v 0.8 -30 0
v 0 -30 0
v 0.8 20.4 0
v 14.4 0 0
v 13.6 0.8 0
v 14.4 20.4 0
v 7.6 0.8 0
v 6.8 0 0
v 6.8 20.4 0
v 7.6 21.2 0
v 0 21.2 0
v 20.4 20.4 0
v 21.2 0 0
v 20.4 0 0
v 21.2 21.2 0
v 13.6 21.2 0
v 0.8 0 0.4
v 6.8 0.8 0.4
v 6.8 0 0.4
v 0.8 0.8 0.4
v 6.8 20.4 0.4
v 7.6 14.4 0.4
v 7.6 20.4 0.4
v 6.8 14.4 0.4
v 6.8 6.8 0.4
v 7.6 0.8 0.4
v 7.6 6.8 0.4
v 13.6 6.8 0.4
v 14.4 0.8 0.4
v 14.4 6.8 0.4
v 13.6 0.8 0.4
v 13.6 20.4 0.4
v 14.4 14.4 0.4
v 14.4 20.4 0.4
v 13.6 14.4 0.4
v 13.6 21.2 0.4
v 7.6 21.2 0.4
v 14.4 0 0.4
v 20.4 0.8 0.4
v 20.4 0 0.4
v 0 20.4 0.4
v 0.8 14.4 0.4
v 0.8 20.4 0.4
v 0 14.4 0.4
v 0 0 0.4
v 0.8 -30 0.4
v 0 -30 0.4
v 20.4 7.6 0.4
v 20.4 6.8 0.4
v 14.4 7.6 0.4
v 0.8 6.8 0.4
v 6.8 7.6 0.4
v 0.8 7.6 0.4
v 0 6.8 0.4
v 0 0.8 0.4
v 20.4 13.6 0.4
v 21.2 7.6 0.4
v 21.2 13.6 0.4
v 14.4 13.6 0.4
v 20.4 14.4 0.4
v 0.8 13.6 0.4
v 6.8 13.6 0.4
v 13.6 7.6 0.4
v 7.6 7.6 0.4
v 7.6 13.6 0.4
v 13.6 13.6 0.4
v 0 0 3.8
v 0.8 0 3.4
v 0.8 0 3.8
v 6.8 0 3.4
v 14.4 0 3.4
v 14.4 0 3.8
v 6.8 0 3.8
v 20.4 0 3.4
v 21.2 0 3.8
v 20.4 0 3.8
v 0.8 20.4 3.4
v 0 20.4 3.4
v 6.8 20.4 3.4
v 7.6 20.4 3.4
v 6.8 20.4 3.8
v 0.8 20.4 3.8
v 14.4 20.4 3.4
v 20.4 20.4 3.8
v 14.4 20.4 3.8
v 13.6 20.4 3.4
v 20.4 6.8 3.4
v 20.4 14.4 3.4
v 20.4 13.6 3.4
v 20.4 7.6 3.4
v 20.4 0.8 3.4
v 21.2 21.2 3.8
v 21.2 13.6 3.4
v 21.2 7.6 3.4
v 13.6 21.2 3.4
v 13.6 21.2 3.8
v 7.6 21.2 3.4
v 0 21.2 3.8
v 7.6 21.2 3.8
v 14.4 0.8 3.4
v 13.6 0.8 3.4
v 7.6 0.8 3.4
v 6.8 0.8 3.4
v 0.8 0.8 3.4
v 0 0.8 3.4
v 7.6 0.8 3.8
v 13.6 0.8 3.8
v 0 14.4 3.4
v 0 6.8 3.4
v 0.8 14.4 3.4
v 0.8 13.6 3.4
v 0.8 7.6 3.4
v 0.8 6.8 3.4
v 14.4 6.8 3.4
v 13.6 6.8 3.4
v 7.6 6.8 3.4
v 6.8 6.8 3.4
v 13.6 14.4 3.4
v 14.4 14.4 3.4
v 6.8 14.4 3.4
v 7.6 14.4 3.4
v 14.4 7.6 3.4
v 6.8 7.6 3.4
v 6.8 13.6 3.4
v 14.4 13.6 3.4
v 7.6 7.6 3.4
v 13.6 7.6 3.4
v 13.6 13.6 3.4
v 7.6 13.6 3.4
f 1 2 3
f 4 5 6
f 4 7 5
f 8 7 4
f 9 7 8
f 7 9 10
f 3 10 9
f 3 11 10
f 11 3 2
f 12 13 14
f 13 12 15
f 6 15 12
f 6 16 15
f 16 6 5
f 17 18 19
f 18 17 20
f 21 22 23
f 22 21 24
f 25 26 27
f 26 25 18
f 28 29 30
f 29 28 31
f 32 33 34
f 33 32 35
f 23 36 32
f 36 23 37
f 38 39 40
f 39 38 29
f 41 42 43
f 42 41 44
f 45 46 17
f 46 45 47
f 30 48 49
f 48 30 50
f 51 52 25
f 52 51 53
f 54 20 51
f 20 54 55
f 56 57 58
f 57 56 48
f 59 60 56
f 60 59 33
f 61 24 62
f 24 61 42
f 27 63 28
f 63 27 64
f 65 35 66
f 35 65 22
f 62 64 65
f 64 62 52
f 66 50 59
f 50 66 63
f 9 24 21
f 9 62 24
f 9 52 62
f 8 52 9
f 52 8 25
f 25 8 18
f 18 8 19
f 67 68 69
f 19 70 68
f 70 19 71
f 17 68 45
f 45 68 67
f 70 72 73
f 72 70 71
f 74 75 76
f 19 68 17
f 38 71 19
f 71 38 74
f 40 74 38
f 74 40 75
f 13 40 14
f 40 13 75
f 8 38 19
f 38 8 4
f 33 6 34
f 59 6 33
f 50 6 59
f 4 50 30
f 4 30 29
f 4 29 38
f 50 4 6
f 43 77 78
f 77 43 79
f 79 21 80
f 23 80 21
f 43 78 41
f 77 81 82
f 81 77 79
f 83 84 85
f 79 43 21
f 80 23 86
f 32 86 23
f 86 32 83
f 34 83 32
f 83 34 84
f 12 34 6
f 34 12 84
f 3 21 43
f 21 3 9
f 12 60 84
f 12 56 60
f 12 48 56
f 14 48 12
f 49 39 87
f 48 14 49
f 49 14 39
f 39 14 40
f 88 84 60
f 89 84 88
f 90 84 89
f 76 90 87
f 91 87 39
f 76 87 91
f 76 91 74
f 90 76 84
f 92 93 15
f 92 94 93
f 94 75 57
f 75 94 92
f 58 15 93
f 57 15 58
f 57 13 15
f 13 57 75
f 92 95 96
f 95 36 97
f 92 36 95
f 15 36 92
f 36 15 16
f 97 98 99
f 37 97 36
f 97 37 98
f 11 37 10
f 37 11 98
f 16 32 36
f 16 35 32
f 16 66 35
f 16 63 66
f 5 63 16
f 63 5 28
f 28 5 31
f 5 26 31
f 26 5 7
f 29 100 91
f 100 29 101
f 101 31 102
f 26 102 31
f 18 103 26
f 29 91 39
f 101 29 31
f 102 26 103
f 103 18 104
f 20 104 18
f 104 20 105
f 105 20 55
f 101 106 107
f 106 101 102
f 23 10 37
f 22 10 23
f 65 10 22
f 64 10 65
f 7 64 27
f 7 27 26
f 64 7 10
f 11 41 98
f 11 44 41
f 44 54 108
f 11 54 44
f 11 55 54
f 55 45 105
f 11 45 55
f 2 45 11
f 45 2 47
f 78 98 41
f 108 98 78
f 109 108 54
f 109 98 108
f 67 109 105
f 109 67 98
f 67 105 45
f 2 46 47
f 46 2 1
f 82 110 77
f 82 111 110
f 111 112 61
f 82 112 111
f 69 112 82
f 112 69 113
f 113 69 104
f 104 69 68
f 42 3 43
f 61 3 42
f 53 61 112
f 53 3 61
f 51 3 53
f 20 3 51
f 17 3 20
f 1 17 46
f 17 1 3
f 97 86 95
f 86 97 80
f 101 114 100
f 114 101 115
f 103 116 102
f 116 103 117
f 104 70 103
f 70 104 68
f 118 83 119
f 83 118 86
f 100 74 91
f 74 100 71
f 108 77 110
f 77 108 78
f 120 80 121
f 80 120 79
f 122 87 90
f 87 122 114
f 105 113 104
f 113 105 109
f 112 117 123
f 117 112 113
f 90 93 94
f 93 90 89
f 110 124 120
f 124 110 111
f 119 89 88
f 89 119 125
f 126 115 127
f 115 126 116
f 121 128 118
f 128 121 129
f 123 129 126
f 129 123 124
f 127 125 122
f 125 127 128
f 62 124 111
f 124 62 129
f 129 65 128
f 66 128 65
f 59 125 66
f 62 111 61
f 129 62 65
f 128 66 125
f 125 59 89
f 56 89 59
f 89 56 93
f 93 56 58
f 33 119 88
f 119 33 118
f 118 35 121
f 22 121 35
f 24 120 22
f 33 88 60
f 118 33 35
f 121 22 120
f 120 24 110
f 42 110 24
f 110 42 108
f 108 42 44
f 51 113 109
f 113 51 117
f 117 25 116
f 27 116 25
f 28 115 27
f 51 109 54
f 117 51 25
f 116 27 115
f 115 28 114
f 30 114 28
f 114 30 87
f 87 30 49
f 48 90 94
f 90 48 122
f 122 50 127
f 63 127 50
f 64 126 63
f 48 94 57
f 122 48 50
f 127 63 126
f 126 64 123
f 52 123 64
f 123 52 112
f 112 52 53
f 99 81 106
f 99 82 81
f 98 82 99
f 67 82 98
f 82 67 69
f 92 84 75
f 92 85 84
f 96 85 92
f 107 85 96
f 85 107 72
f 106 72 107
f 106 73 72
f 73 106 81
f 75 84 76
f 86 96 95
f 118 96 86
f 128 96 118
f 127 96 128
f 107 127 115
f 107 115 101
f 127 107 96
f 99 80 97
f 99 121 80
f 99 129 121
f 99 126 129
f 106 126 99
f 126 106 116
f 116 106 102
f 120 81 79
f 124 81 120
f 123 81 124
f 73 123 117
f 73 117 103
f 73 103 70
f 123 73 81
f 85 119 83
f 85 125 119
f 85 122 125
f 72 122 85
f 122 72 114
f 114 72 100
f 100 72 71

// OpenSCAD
// file: ../../api/v3/reporting.scad
//////////////////////////////////////////////////////////////////////
// LibFile: reporting.scad
// Project: Grid Stack
// FileGroup: API v3 Reporting
// FileSummary: Console report for immutable direct and positive-gap coupons.
// Role: Records the exact environment, dimensions, support strategy, path
//       lengths, qualification status, and deposited-layer counts.
// Requires: API v3 indexes, mathematics, and path generator.
// Exports: report_structural_coupon_object().
//////////////////////////////////////////////////////////////////////

function _bridge_status3(span, process) =
    span <= process[PX3_BRIDGE_MAX]
        ? "within_owner_tested_limit"
        : "exploratory_beyond_owner_tested_limit";

module report_structural_coupon_object(object, report_level = "full") {
    material = object[SCO_MATERIAL];
    nozzle = object[SCO_NOZZLE];
    printer = object[SCO_PRINTER];
    process = object[SCO_PROCESS];
    boundary = object[SCO_BOUNDARY];
    gap = object[SCO_CLEAR_GAP];
    strategy = object[SCO_SUPPORT_STRATEGY];

    echo("--- Grid Stack immutable structural coupon ---");
    echo(str("Object: ", object[SCO_NAME], " revision ", object[SCO_REVISION]));
    echo(str("API/schema: ", object[SCO_REQUIRED_API], "/",
        object[SCO_SCHEMA_VERSION]));
    echo(str("Release/base commit: ", object[SCO_SOURCE_RELEASE], " / ",
        object[SCO_FRAMEWORK_BASE_COMMIT]));
    echo(str("Material/nozzle/printer: ", material[MAT3_FAMILY], " / ",
        nozzle[NZ3_DIAMETER], " mm / ", printer[PRN3_NAME]));
    echo(str("Cells: ", boundary[B3_CELLS_X], " x ", boundary[B3_CELLS_Y]));
    echo(str("Clear spans: ", boundary[B3_CLEAR_SPAN_X], " x ",
        boundary[B3_CLEAR_SPAN_Y], " mm"));
    echo(str("Span status: ",
        _bridge_status3(boundary[B3_CLEAR_SPAN_X], process)));
    echo(str("Outside size: ", boundary_size_x3(boundary, process, nozzle),
        " x ", boundary_size_y3(boundary, process, nozzle), " mm"));
    echo(str("Primitive trace: ", trace_width3(nozzle), " x ",
        trace_height3(process), " mm"));
    echo(str("Structural strand: ", strand_width3(process, nozzle), " x ",
        strand_height3(process), " mm"));
    echo(str("Clear vertical gap: ", gap, " mm"));
    echo(str("Support strategy: ", strategy));
    echo(str("Total modeled height: ", coupon_total_height3(object), " mm"));

    if (report_level == "full") {
        if (strategy == "direct_orthogonal") {
            lower = coupon_path(
                boundary, process, nozzle, 0, object[SCO_LEAD_IN]
            );
            upper = coupon_path(boundary, process, nozzle, 90, 0);
            echo(str("Lower/upper path lengths: ", path_length3(lower),
                " / ", path_length3(upper), " mm"));
            echo(str("Deposited layers: ", 2 * process[PX3_HEIGHT_PASSES]));
        }
        else {
            witness = coupon_path(
                boundary, process, nozzle, 90, object[SCO_LEAD_IN]
            );
            riser = coupon_path(boundary, process, nozzle, 0, 0);
            test = coupon_path(boundary, process, nozzle, 90, 0);
            echo(str("Witness/riser/test path lengths: ",
                path_length3(witness), " / ", path_length3(riser), " / ",
                path_length3(test), " mm"));
            echo(str("Riser deposited layers: ", round(gap_layer_count3(object))));
            echo(str("Total deposited layers: ",
                2 * process[PX3_HEIGHT_PASSES] +
                round(gap_layer_count3(object))));
        }
        echo(str("Status: ", object[SCO_STATUS]));
        echo(str("Notes: ", object[SCO_NOTES]));
    }
}
// file: ../../api/v3/validation.scad
//////////////////////////////////////////////////////////////////////
// LibFile: validation.scad
// Project: Grid Stack
// FileGroup: API v3 Validation
// FileSummary: Validates immutable environment records, count boundaries,
//              support strategy, path continuity, and layer quantization.
// Role: Rejects incompatible or physically floating recipes before geometry
//       is generated.
// Requires: API v3 indexes, mathematics, and path generator.
// Exports: validate_structural_coupon_object().
//////////////////////////////////////////////////////////////////////

module _validate_path3(points, boundary, orientation, lead_in) {
    run_count = orientation == 0
        ? boundary_strand_count_y3(boundary)
        : boundary_strand_count_x3(boundary);

    assert(len(points) == expected_coupon_point_count3(run_count, lead_in),
        "API v3 coupon path has an unexpected point count.");
    assert(!path_has_zero_segment3(points),
        "API v3 coupon path contains a zero-length segment.");
    assert(path_axis_aligned3(points),
        "API v3 coupon path must remain axis-aligned.");
    assert(points[0] != points[len(points) - 1],
        "API v3 coupon path must remain open.");
}

module validate_structural_coupon_object(object) {
    assert(object[SCO_REQUIRED_API] == GRID_STACK_API_VERSION,
        "Saved coupon requires a different Grid Stack API version.");
    assert(object[SCO_SCHEMA_VERSION] == GRID_STACK_COUPON_SCHEMA_VERSION,
        "Saved coupon requires a different coupon schema version.");
    assert(GRID_STACK_RECTANGULAR_FRAMEWORK_VERSION == 2,
        "Saved coupon requires rectangular framework version 2.");

    material = object[SCO_MATERIAL];
    nozzle = object[SCO_NOZZLE];
    printer = object[SCO_PRINTER];
    process = object[SCO_PROCESS];
    boundary = object[SCO_BOUNDARY];
    gap = object[SCO_CLEAR_GAP];
    lead_in = object[SCO_LEAD_IN];
    strategy = object[SCO_SUPPORT_STRATEGY];

    assert(nozzle[NZ3_DIAMETER] > 0,
        "Saved coupon nozzle diameter must be positive.");
    assert(process[PX3_LAYER_H] > 0,
        "Saved coupon layer height must be positive.");
    assert(process[PX3_WIDTH_PASSES] >= 2,
        "Saved coupon structural width requires at least two passes.");
    assert(process[PX3_HEIGHT_PASSES] >= 2,
        "Saved coupon structural height requires at least two layers.");
    assert(process[PX3_MATERIAL] == material[MAT3_NAME],
        "Saved coupon process/material references do not match.");
    assert(process[PX3_NOZZLE] == nozzle[NZ3_NAME],
        "Saved coupon process/nozzle references do not match.");
    assert(process[PX3_PRINTER] == printer[PRN3_NAME],
        "Saved coupon process/printer references do not match.");
    assert(boundary[B3_CELLS_X] > 0 && boundary[B3_CELLS_Y] > 0,
        "Saved coupon cell counts must be positive.");
    assert(boundary[B3_CLEAR_SPAN_X] > 0 &&
           boundary[B3_CLEAR_SPAN_Y] > 0,
        "Saved coupon clear spans must be positive.");
    assert(lead_in >= 0,
        "Saved coupon lead-in cannot be negative.");
    assert(gap >= 0,
        "Saved coupon clear gap cannot be negative.");
    assert(nearly_equal3(gap_layer_count3(object), round(gap_layer_count3(object))),
        "Saved coupon clear gap must equal a whole deposited-layer count.");
    assert(
        (strategy == "direct_orthogonal" && nearly_equal3(gap, 0)) ||
        (strategy == "witness_riser_bridge" && gap > 0),
        "Saved coupon support strategy does not match its clear gap."
    );

    if (strategy == "direct_orthogonal") {
        lower = coupon_path(boundary, process, nozzle, 0, lead_in);
        upper = coupon_path(boundary, process, nozzle, 90, 0);
        _validate_path3(lower, boundary, 0, lead_in);
        _validate_path3(upper, boundary, 90, 0);
        entry = lead_in > 0 ? 1 : 0;
        assert(nearly_equal3(point_distance_2d3(lower[entry], upper[0]), 0),
            "Direct upper path must start on the lower entry crossing.");
    }
    else {
        witness = coupon_path(boundary, process, nozzle, 90, lead_in);
        riser = coupon_path(boundary, process, nozzle, 0, 0);
        test = coupon_path(boundary, process, nozzle, 90, 0);
        _validate_path3(witness, boundary, 90, lead_in);
        _validate_path3(riser, boundary, 0, 0);
        _validate_path3(test, boundary, 90, 0);
        entry = lead_in > 0 ? 1 : 0;
        assert(nearly_equal3(point_distance_2d3(witness[entry], riser[0]), 0),
            "Riser path must start on the witness entry crossing.");
        assert(nearly_equal3(point_distance_2d3(riser[0], test[0]), 0),
            "Upper test path must start on the riser entry crossing.");
        for (i = [0 : len(test) - 1])
            assert(nearly_equal3(point_distance_2d3(test[i], witness[i + entry]), 0),
                "Upper test path must align directly above the witness path.");
    }

    echo("GRID STACK API V3 COUPON VALIDATION: PASS");
}
// file: ../../api/v3/geometry.scad
//////////////////////////////////////////////////////////////////////
// LibFile: geometry.scad
// Project: Grid Stack
// FileGroup: API v3 Printable Geometry
// FileSummary: Creates square-ended structural paths, direct-contact coupons,
//              positive witness/riser/bridge coupons, and simple diagnostics.
// Role: Supplies all geometry used by immutable API v3 recipes without
//       importing mutable workbench geometry.
// Requires: API v3 mathematics and ordered axis-aligned paths.
// Exports: render_direct_coupon(), render_positive_gap_coupon(), and
//          render_coupon_path_debug().
//////////////////////////////////////////////////////////////////////

module _segment_2d3(a, b, width) {
    horizontal = nearly_equal3(a[1], b[1]);
    vertical = nearly_equal3(a[0], b[0]);

    assert(horizontal || vertical,
        "API v3 printable segments must be horizontal or vertical.");
    assert(!nearly_equal3(point_distance_2d3(a, b), 0),
        "API v3 printable segments must have nonzero length.");

    if (horizontal)
        translate([min(a[0], b[0]) - width / 2, a[1] - width / 2])
            square([abs(b[0] - a[0]) + width, width]);
    else
        translate([a[0] - width / 2, min(a[1], b[1]) - width / 2])
            square([width, abs(b[1] - a[1]) + width]);
}

module _path_2d3(points, width) {
    union()
        for (i = [0 : len(points) - 2])
            _segment_2d3(points[i], points[i + 1], width);
}

module _structural_path3(points, process, nozzle) {
    linear_extrude(height = strand_height3(process), convexity = 10)
        _path_2d3(points, strand_width3(process, nozzle));
}

module render_direct_coupon(lower, upper, process, nozzle) {
    union() {
        _structural_path3(lower, process, nozzle);
        translate([0, 0, strand_height3(process)])
            _structural_path3(upper, process, nozzle);
    }
}

module render_positive_gap_coupon(
    witness, riser, test, process, nozzle, clear_gap
) {
    union() {
        _structural_path3(witness, process, nozzle);

        translate([0, 0, strand_height3(process)])
            linear_extrude(height = clear_gap, convexity = 10)
                _path_2d3(riser, strand_width3(process, nozzle));

        translate([0, 0, strand_height3(process) + clear_gap])
            _structural_path3(test, process, nozzle);
    }
}

module _debug_path3(points, z, width) {
    translate([0, 0, z])
        linear_extrude(height = 0.04)
            _path_2d3(points, width);
}

module render_coupon_path_debug(
    lower, upper, riser, process, clear_gap = 0
) {
    width = max(0.12, trace_height3(process));
    _debug_path3(lower, 0, width);
    if (len(riser) > 0)
        _debug_path3(riser, strand_height3(process), width);
    _debug_path3(
        upper,
        strand_height3(process) + clear_gap,
        width
    );
}
// file: ../../api/v3/paths.scad
//////////////////////////////////////////////////////////////////////
// LibFile: paths.scad
// Project: Grid Stack
// FileGroup: API v3 Path Generation
// FileSummary: Generates one open rectangular serpentine centerline from a
//              count boundary for X- or Y-running structural paths.
// Role: Preserves parallel runs, square connectors, optional single lead-in,
//       and one uninterrupted ordered point list per deposited layer.
// Requires: API v3 indexes and mathematics.
// Exports: coupon_path() and expected_coupon_point_count3().
//////////////////////////////////////////////////////////////////////

function _x_rows3(row, count, x_min, x_max, y_min, pitch) =
    row >= count
        ? []
        : let(
            y = y_min + row * pitch,
            x_end = row % 2 == 0 ? x_max : x_min,
            row_end = [x_end, y],
            connector_end = [x_end, y + pitch]
        )
        concat(
            [row_end],
            row < count - 1 ? [connector_end] : [],
            _x_rows3(row + 1, count, x_min, x_max, y_min, pitch)
        );

function _y_columns3(column, count, x_min, y_min, y_max, pitch) =
    column >= count
        ? []
        : let(
            x = x_min + column * pitch,
            y_end = column % 2 == 0 ? y_max : y_min,
            column_end = [x, y_end],
            connector_end = [x + pitch, y_end]
        )
        concat(
            [column_end],
            column < count - 1 ? [connector_end] : [],
            _y_columns3(column + 1, count, x_min, y_min, y_max, pitch)
        );

function expected_coupon_point_count3(run_count, lead_in = 0) =
    2 * run_count + (lead_in > 0 ? 1 : 0);

function coupon_path(
    boundary, process, nozzle, orientation = 0, lead_in = 0
) =
    assert(orientation == 0 || orientation == 90,
        "API v3 coupon orientation must be 0 or 90 degrees.")
    assert(lead_in >= 0,
        "API v3 coupon lead-in cannot be negative.")
    let(
        width = strand_width3(process, nozzle),
        x_min = width / 2,
        y_min = width / 2,
        x_max = boundary_size_x3(boundary, process, nozzle) - width / 2,
        y_max = boundary_size_y3(boundary, process, nozzle) - width / 2,
        entry = [x_min, y_min],
        prefix = lead_in > 0
            ? (orientation == 0
                ? [[x_min - lead_in, y_min], entry]
                : [[x_min, y_min - lead_in], entry])
            : [entry]
    )
    orientation == 0
        ? concat(
            prefix,
            _x_rows3(
                0, boundary_strand_count_y3(boundary),
                x_min, x_max, y_min,
                boundary_pitch_y3(boundary, process, nozzle)
            )
        )
        : concat(
            prefix,
            _y_columns3(
                0, boundary_strand_count_x3(boundary),
                x_min, y_min, y_max,
                boundary_pitch_x3(boundary, process, nozzle)
            )
        );
// file: ../../api/v3/math.scad
//////////////////////////////////////////////////////////////////////
// LibFile: math.scad
// Project: Grid Stack
// FileGroup: API v3 Mathematics
// FileSummary: Pure trace, strand, boundary, path, and layer-count helpers.
// Role: Keeps API v3 calculations isolated and reproducible without importing
//       mutable workbench mathematics.
// Requires: API v3 indexes.
// Exports: nearly_equal3(), trace/strand dimensions, boundary dimensions,
//          path inspection, gap-layer count, and total-height helpers.
//////////////////////////////////////////////////////////////////////

function nearly_equal3(a, b, epsilon = 0.000001) = abs(a - b) <= epsilon;

function trace_width3(nozzle) = nozzle[NZ3_DIAMETER];
function trace_height3(process) = process[PX3_LAYER_H];
function strand_width3(process, nozzle) =
    trace_width3(nozzle) * process[PX3_WIDTH_PASSES];
function strand_height3(process) =
    trace_height3(process) * process[PX3_HEIGHT_PASSES];

function boundary_strand_count_x3(boundary) = boundary[B3_CELLS_X] + 1;
function boundary_strand_count_y3(boundary) = boundary[B3_CELLS_Y] + 1;
function boundary_pitch_x3(boundary, process, nozzle) =
    boundary[B3_CLEAR_SPAN_X] + strand_width3(process, nozzle);
function boundary_pitch_y3(boundary, process, nozzle) =
    boundary[B3_CLEAR_SPAN_Y] + strand_width3(process, nozzle);
function boundary_size_x3(boundary, process, nozzle) =
    boundary[B3_CELLS_X] * boundary[B3_CLEAR_SPAN_X] +
    boundary_strand_count_x3(boundary) * strand_width3(process, nozzle);
function boundary_size_y3(boundary, process, nozzle) =
    boundary[B3_CELLS_Y] * boundary[B3_CLEAR_SPAN_Y] +
    boundary_strand_count_y3(boundary) * strand_width3(process, nozzle);

function point_distance_2d3(a, b) =
    sqrt(pow(b[0] - a[0], 2) + pow(b[1] - a[1], 2));
function path_length3(points, i = 0) =
    i >= len(points) - 1
        ? 0
        : point_distance_2d3(points[i], points[i + 1]) +
          path_length3(points, i + 1);
function path_has_zero_segment3(points, i = 0) =
    i >= len(points) - 1
        ? false
        : nearly_equal3(point_distance_2d3(points[i], points[i + 1]), 0)
            ? true
            : path_has_zero_segment3(points, i + 1);
function segment_axis_aligned3(a, b) =
    nearly_equal3(a[0], b[0]) || nearly_equal3(a[1], b[1]);
function path_axis_aligned3(points, i = 0) =
    i >= len(points) - 1
        ? true
        : segment_axis_aligned3(points[i], points[i + 1]) &&
          path_axis_aligned3(points, i + 1);

function gap_layer_count3(object) =
    object[SCO_CLEAR_GAP] / trace_height3(object[SCO_PROCESS]);
function coupon_total_height3(object) =
    2 * strand_height3(object[SCO_PROCESS]) + object[SCO_CLEAR_GAP];
// file: ../../api/v3/schema.scad
//////////////////////////////////////////////////////////////////////
// LibFile: schema.scad
// Project: Grid Stack
// FileGroup: API v3 Data Model
// FileSummary: Constructors for self-contained immutable structural coupons.
// Role: Makes every geometry-affecting environment and object value explicit
//       inside the saved recipe rather than resolving mutable catalog names.
// Exports: material_spec(), nozzle_spec(), printer_spec(),
//          structural_process_profile(), count_boundary(), and
//          structural_coupon_object().
//////////////////////////////////////////////////////////////////////

function material_spec(
    name, family, flexibility, status = "in_use", notes = ""
) = [name, family, flexibility, status, notes];

function nozzle_spec(
    name, diameter, construction = "brass", status = "in_use", notes = ""
) = [name, diameter, construction, status, notes];

function printer_spec(
    name,
    manufacturer = "",
    model = "",
    motion_system = "",
    build_surface = "",
    status = "unrecorded",
    notes = ""
) = [
    name, manufacturer, model, motion_system,
    build_surface, status, notes
];

function structural_process_profile(
    name,
    material_name,
    nozzle_name,
    printer_name,
    layer_height,
    width_passes,
    height_passes,
    bridge_max,
    qualification,
    revision,
    notes = ""
) = [
    name, material_name, nozzle_name, printer_name,
    layer_height, width_passes, height_passes, bridge_max,
    qualification, revision, notes
];

// Function: count_boundary()
// Synopsis: Stores clear-opening counts and clear spans for one rectangle.
function count_boundary(
    name,
    cells_x,
    cells_y,
    clear_span_x,
    clear_span_y,
    notes = ""
) = [name, cells_x, cells_y, clear_span_x, clear_span_y, notes];

// Function: structural_coupon_object()
// Synopsis: Constructs one permanent coupon recipe.
// Description:
//   framework_base_commit records the last accepted repository state used to
//   begin the API implementation. The Git commit containing this recipe is the
//   authoritative complete source; a file cannot embed its own future hash.
function structural_coupon_object(
    name,
    revision,
    required_api_version,
    coupon_schema_version,
    source_release,
    framework_base_commit,
    material,
    nozzle,
    printer,
    process,
    boundary,
    clear_vertical_gap,
    lead_in,
    support_strategy,
    status = "calibration",
    notes = ""
) = [
    name,
    revision,
    required_api_version,
    coupon_schema_version,
    source_release,
    framework_base_commit,
    material,
    nozzle,
    printer,
    process,
    boundary,
    clear_vertical_gap,
    lead_in,
    support_strategy,
    status,
    notes
];
// file: ../../api/v3/indices.scad
//////////////////////////////////////////////////////////////////////
// LibFile: indices.scad
// Project: Grid Stack
// FileGroup: API v3 Data Model
// FileSummary: Named indexes for immutable structural-coupon records.
// Role: Prevents unexplained numeric indexes from entering saved recipes and
//       keeps API version 3 independent of mutable workbench indexes.
// Exports: MAT3_*, NZ3_*, PRN3_*, PX3_*, B3_*, and SCO_* constants.
//////////////////////////////////////////////////////////////////////

MAT3_NAME = 0;
MAT3_FAMILY = 1;
MAT3_FLEXIBILITY = 2;
MAT3_STATUS = 3;
MAT3_NOTES = 4;

NZ3_NAME = 0;
NZ3_DIAMETER = 1;
NZ3_CONSTRUCTION = 2;
NZ3_STATUS = 3;
NZ3_NOTES = 4;

PRN3_NAME = 0;
PRN3_MANUFACTURER = 1;
PRN3_MODEL = 2;
PRN3_MOTION_SYSTEM = 3;
PRN3_BUILD_SURFACE = 4;
PRN3_STATUS = 5;
PRN3_NOTES = 6;

PX3_NAME = 0;
PX3_MATERIAL = 1;
PX3_NOZZLE = 2;
PX3_PRINTER = 3;
PX3_LAYER_H = 4;
PX3_WIDTH_PASSES = 5;
PX3_HEIGHT_PASSES = 6;
PX3_BRIDGE_MAX = 7;
PX3_QUALIFICATION = 8;
PX3_REVISION = 9;
PX3_NOTES = 10;

B3_NAME = 0;
B3_CELLS_X = 1;
B3_CELLS_Y = 2;
B3_CLEAR_SPAN_X = 3;
B3_CLEAR_SPAN_Y = 4;
B3_NOTES = 5;

SCO_NAME = 0;
SCO_REVISION = 1;
SCO_REQUIRED_API = 2;
SCO_SCHEMA_VERSION = 3;
SCO_SOURCE_RELEASE = 4;
SCO_FRAMEWORK_BASE_COMMIT = 5;
SCO_MATERIAL = 6;
SCO_NOZZLE = 7;
SCO_PRINTER = 8;
SCO_PROCESS = 9;
SCO_BOUNDARY = 10;
SCO_CLEAR_GAP = 11;
SCO_LEAD_IN = 12;
SCO_SUPPORT_STRATEGY = 13;
SCO_STATUS = 14;
SCO_NOTES = 15;
// file: ../../api/grid_stack_v3.scad
//////////////////////////////////////////////////////////////////////
// LibFile: grid_stack_v3.scad
// Project: Grid Stack
// FileGroup: Versioned Public Interface
// FileSummary: Immutable API version 3 for rectangular count-boundary
//              structural coupons, including positive witness/riser gaps.
// Role: Reconstructs saved coupon recipes without Customizer state or mutable
//       workbench catalogs. Incompatible behavior requires a new API file.
// Exports: API/schema constants, record constructors, validation, reporting,
//          and structural_coupon_render().
//////////////////////////////////////////////////////////////////////

GRID_STACK_API_VERSION = 3;
GRID_STACK_COUPON_SCHEMA_VERSION = 1;
GRID_STACK_RECTANGULAR_FRAMEWORK_VERSION = 2;
GRID_STACK_RELEASE = "1.0.0";

include <v3/indices.scad>
include <v3/schema.scad>
include <v3/math.scad>
include <v3/paths.scad>
include <v3/geometry.scad>
include <v3/validation.scad>
include <v3/reporting.scad>

// Module: structural_coupon_render()
// Synopsis: Validates, reports, and renders one immutable coupon recipe.
// Arguments:
//   object = Record returned by structural_coupon_object().
//   mode = print, path_debug, or report_only.
//   report_level = summary or full.
module structural_coupon_render(
    object,
    mode = "print",
    report_level = "full"
) {
    validate_structural_coupon_object(object);
    report_structural_coupon_object(object, report_level);

    boundary = object[SCO_BOUNDARY];
    process = object[SCO_PROCESS];
    nozzle = object[SCO_NOZZLE];
    lead_in = object[SCO_LEAD_IN];
    clear_gap = object[SCO_CLEAR_GAP];
    strategy = object[SCO_SUPPORT_STRATEGY];

    if (strategy == "direct_orthogonal") {
        lower = coupon_path(boundary, process, nozzle, 0, lead_in);
        upper = coupon_path(boundary, process, nozzle, 90, 0);

        if (mode == "print")
            render_direct_coupon(lower, upper, process, nozzle);
        else if (mode == "path_debug")
            render_coupon_path_debug(lower, upper, [], process);
        else if (mode == "report_only")
            echo("Grid Stack API v3 report-only mode: no geometry generated.");
        else
            assert(false, str("Unknown API v3 render mode: ", mode));
    }
    else if (strategy == "witness_riser_bridge") {
        witness = coupon_path(boundary, process, nozzle, 90, lead_in);
        riser = coupon_path(boundary, process, nozzle, 0, 0);
        test = coupon_path(boundary, process, nozzle, 90, 0);

        if (mode == "print")
            render_positive_gap_coupon(
                witness, riser, test, process, nozzle, clear_gap
            );
        else if (mode == "path_debug")
            render_coupon_path_debug(witness, test, riser, process, clear_gap);
        else if (mode == "report_only")
            echo("Grid Stack API v3 report-only mode: no geometry generated.");
        else
            assert(false, str("Unknown API v3 render mode: ", mode));
    }
    else
        assert(false, str("Unknown coupon support strategy: ", strategy));
}
// main file
//////////////////////////////////////////////////////////////////////
// LibFile: coupon-3x3-span6-gap3-pla-plus-0p4-v1.scad
// Project: Grid Stack
// FileGroup: Immutable Structural Coupon
// FileSummary: 3 x 3 PLA+ coupon with 6 mm clear XY spans and 3 mm
//              clear vertical gap using witness_riser_bridge geometry.
// Role: Permanently reconstructs one calibration object without Customizer
//       state or mutable workbench catalog lookup.
// FrameworkBaseCommit: 4b5e564
// Requires: Grid Stack API version 3 and coupon schema version 1.
// Output: Printable continuous-path structural coupon geometry.
//////////////////////////////////////////////////////////////////////

include <../../api/grid_stack_v3.scad>

assert(GRID_STACK_API_VERSION == 3,
    "This recipe requires Grid Stack API version 3.");
assert(GRID_STACK_COUPON_SCHEMA_VERSION == 1,
    "This recipe requires coupon schema version 1.");
assert(GRID_STACK_RECTANGULAR_FRAMEWORK_VERSION == 2,
    "This recipe requires rectangular framework version 2.");

saved_material = material_spec(
    name = "PLA_PLUS",
    family = "PLA+",
    flexibility = "rigid",
    status = "in_use",
    notes = "Exact material family selected for the coupon matrix."
);

saved_nozzle = nozzle_spec(
    name = "BRASS_0P4",
    diameter = 0.4,
    construction = "brass",
    status = "in_use",
    notes = "Nominal nozzle diameter used to derive the 0.8 mm strand width."
);

saved_printer = printer_spec(
    name = "UNRECORDED_PRINTER_R1",
    manufacturer = "",
    model = "",
    motion_system = "",
    build_surface = "",
    status = "unrecorded",
    notes = "Printer identity was not frozen with this coupon framework."
);

saved_process = structural_process_profile(
    name = "PLA_PLUS_0P4_LH0P2_W2_H2_R1",
    material_name = "PLA_PLUS",
    nozzle_name = "BRASS_0P4",
    printer_name = "UNRECORDED_PRINTER_R1",
    layer_height = 0.2,
    width_passes = 2,
    height_passes = 2,
    bridge_max = 6,
    qualification = "owner_tested_to_6mm",
    revision = 1,
    notes = "Primitive trace 0.4 x 0.2 mm; structural strand 0.8 x 0.4 mm."
);

saved_boundary = count_boundary(
    name = "COUNT_3X3_SPAN6",
    cells_x = 3,
    cells_y = 3,
    clear_span_x = 6,
    clear_span_y = 6,
    notes = "Outside dimensions derive from four strands and three clear openings."
);

saved_coupon = structural_coupon_object(
    name = "COUPON_3X3_SPAN6_GAP3_PLA_PLUS_0P4_V1",
    revision = 1,
    required_api_version = 3,
    coupon_schema_version = 1,
    source_release = "1.0.0",
    framework_base_commit = "4b5e564",
    material = saved_material,
    nozzle = saved_nozzle,
    printer = saved_printer,
    process = saved_process,
    boundary = saved_boundary,
    clear_vertical_gap = 3,
    lead_in = 30,
    support_strategy = "witness_riser_bridge",
    status = "calibration_unprinted",
    notes = "Calibration recipe generated from the frozen Batch 010 framework; record results in a new revision after printing."
);

structural_coupon_render(
    saved_coupon,
    mode = "print",
    report_level = "full"
);
